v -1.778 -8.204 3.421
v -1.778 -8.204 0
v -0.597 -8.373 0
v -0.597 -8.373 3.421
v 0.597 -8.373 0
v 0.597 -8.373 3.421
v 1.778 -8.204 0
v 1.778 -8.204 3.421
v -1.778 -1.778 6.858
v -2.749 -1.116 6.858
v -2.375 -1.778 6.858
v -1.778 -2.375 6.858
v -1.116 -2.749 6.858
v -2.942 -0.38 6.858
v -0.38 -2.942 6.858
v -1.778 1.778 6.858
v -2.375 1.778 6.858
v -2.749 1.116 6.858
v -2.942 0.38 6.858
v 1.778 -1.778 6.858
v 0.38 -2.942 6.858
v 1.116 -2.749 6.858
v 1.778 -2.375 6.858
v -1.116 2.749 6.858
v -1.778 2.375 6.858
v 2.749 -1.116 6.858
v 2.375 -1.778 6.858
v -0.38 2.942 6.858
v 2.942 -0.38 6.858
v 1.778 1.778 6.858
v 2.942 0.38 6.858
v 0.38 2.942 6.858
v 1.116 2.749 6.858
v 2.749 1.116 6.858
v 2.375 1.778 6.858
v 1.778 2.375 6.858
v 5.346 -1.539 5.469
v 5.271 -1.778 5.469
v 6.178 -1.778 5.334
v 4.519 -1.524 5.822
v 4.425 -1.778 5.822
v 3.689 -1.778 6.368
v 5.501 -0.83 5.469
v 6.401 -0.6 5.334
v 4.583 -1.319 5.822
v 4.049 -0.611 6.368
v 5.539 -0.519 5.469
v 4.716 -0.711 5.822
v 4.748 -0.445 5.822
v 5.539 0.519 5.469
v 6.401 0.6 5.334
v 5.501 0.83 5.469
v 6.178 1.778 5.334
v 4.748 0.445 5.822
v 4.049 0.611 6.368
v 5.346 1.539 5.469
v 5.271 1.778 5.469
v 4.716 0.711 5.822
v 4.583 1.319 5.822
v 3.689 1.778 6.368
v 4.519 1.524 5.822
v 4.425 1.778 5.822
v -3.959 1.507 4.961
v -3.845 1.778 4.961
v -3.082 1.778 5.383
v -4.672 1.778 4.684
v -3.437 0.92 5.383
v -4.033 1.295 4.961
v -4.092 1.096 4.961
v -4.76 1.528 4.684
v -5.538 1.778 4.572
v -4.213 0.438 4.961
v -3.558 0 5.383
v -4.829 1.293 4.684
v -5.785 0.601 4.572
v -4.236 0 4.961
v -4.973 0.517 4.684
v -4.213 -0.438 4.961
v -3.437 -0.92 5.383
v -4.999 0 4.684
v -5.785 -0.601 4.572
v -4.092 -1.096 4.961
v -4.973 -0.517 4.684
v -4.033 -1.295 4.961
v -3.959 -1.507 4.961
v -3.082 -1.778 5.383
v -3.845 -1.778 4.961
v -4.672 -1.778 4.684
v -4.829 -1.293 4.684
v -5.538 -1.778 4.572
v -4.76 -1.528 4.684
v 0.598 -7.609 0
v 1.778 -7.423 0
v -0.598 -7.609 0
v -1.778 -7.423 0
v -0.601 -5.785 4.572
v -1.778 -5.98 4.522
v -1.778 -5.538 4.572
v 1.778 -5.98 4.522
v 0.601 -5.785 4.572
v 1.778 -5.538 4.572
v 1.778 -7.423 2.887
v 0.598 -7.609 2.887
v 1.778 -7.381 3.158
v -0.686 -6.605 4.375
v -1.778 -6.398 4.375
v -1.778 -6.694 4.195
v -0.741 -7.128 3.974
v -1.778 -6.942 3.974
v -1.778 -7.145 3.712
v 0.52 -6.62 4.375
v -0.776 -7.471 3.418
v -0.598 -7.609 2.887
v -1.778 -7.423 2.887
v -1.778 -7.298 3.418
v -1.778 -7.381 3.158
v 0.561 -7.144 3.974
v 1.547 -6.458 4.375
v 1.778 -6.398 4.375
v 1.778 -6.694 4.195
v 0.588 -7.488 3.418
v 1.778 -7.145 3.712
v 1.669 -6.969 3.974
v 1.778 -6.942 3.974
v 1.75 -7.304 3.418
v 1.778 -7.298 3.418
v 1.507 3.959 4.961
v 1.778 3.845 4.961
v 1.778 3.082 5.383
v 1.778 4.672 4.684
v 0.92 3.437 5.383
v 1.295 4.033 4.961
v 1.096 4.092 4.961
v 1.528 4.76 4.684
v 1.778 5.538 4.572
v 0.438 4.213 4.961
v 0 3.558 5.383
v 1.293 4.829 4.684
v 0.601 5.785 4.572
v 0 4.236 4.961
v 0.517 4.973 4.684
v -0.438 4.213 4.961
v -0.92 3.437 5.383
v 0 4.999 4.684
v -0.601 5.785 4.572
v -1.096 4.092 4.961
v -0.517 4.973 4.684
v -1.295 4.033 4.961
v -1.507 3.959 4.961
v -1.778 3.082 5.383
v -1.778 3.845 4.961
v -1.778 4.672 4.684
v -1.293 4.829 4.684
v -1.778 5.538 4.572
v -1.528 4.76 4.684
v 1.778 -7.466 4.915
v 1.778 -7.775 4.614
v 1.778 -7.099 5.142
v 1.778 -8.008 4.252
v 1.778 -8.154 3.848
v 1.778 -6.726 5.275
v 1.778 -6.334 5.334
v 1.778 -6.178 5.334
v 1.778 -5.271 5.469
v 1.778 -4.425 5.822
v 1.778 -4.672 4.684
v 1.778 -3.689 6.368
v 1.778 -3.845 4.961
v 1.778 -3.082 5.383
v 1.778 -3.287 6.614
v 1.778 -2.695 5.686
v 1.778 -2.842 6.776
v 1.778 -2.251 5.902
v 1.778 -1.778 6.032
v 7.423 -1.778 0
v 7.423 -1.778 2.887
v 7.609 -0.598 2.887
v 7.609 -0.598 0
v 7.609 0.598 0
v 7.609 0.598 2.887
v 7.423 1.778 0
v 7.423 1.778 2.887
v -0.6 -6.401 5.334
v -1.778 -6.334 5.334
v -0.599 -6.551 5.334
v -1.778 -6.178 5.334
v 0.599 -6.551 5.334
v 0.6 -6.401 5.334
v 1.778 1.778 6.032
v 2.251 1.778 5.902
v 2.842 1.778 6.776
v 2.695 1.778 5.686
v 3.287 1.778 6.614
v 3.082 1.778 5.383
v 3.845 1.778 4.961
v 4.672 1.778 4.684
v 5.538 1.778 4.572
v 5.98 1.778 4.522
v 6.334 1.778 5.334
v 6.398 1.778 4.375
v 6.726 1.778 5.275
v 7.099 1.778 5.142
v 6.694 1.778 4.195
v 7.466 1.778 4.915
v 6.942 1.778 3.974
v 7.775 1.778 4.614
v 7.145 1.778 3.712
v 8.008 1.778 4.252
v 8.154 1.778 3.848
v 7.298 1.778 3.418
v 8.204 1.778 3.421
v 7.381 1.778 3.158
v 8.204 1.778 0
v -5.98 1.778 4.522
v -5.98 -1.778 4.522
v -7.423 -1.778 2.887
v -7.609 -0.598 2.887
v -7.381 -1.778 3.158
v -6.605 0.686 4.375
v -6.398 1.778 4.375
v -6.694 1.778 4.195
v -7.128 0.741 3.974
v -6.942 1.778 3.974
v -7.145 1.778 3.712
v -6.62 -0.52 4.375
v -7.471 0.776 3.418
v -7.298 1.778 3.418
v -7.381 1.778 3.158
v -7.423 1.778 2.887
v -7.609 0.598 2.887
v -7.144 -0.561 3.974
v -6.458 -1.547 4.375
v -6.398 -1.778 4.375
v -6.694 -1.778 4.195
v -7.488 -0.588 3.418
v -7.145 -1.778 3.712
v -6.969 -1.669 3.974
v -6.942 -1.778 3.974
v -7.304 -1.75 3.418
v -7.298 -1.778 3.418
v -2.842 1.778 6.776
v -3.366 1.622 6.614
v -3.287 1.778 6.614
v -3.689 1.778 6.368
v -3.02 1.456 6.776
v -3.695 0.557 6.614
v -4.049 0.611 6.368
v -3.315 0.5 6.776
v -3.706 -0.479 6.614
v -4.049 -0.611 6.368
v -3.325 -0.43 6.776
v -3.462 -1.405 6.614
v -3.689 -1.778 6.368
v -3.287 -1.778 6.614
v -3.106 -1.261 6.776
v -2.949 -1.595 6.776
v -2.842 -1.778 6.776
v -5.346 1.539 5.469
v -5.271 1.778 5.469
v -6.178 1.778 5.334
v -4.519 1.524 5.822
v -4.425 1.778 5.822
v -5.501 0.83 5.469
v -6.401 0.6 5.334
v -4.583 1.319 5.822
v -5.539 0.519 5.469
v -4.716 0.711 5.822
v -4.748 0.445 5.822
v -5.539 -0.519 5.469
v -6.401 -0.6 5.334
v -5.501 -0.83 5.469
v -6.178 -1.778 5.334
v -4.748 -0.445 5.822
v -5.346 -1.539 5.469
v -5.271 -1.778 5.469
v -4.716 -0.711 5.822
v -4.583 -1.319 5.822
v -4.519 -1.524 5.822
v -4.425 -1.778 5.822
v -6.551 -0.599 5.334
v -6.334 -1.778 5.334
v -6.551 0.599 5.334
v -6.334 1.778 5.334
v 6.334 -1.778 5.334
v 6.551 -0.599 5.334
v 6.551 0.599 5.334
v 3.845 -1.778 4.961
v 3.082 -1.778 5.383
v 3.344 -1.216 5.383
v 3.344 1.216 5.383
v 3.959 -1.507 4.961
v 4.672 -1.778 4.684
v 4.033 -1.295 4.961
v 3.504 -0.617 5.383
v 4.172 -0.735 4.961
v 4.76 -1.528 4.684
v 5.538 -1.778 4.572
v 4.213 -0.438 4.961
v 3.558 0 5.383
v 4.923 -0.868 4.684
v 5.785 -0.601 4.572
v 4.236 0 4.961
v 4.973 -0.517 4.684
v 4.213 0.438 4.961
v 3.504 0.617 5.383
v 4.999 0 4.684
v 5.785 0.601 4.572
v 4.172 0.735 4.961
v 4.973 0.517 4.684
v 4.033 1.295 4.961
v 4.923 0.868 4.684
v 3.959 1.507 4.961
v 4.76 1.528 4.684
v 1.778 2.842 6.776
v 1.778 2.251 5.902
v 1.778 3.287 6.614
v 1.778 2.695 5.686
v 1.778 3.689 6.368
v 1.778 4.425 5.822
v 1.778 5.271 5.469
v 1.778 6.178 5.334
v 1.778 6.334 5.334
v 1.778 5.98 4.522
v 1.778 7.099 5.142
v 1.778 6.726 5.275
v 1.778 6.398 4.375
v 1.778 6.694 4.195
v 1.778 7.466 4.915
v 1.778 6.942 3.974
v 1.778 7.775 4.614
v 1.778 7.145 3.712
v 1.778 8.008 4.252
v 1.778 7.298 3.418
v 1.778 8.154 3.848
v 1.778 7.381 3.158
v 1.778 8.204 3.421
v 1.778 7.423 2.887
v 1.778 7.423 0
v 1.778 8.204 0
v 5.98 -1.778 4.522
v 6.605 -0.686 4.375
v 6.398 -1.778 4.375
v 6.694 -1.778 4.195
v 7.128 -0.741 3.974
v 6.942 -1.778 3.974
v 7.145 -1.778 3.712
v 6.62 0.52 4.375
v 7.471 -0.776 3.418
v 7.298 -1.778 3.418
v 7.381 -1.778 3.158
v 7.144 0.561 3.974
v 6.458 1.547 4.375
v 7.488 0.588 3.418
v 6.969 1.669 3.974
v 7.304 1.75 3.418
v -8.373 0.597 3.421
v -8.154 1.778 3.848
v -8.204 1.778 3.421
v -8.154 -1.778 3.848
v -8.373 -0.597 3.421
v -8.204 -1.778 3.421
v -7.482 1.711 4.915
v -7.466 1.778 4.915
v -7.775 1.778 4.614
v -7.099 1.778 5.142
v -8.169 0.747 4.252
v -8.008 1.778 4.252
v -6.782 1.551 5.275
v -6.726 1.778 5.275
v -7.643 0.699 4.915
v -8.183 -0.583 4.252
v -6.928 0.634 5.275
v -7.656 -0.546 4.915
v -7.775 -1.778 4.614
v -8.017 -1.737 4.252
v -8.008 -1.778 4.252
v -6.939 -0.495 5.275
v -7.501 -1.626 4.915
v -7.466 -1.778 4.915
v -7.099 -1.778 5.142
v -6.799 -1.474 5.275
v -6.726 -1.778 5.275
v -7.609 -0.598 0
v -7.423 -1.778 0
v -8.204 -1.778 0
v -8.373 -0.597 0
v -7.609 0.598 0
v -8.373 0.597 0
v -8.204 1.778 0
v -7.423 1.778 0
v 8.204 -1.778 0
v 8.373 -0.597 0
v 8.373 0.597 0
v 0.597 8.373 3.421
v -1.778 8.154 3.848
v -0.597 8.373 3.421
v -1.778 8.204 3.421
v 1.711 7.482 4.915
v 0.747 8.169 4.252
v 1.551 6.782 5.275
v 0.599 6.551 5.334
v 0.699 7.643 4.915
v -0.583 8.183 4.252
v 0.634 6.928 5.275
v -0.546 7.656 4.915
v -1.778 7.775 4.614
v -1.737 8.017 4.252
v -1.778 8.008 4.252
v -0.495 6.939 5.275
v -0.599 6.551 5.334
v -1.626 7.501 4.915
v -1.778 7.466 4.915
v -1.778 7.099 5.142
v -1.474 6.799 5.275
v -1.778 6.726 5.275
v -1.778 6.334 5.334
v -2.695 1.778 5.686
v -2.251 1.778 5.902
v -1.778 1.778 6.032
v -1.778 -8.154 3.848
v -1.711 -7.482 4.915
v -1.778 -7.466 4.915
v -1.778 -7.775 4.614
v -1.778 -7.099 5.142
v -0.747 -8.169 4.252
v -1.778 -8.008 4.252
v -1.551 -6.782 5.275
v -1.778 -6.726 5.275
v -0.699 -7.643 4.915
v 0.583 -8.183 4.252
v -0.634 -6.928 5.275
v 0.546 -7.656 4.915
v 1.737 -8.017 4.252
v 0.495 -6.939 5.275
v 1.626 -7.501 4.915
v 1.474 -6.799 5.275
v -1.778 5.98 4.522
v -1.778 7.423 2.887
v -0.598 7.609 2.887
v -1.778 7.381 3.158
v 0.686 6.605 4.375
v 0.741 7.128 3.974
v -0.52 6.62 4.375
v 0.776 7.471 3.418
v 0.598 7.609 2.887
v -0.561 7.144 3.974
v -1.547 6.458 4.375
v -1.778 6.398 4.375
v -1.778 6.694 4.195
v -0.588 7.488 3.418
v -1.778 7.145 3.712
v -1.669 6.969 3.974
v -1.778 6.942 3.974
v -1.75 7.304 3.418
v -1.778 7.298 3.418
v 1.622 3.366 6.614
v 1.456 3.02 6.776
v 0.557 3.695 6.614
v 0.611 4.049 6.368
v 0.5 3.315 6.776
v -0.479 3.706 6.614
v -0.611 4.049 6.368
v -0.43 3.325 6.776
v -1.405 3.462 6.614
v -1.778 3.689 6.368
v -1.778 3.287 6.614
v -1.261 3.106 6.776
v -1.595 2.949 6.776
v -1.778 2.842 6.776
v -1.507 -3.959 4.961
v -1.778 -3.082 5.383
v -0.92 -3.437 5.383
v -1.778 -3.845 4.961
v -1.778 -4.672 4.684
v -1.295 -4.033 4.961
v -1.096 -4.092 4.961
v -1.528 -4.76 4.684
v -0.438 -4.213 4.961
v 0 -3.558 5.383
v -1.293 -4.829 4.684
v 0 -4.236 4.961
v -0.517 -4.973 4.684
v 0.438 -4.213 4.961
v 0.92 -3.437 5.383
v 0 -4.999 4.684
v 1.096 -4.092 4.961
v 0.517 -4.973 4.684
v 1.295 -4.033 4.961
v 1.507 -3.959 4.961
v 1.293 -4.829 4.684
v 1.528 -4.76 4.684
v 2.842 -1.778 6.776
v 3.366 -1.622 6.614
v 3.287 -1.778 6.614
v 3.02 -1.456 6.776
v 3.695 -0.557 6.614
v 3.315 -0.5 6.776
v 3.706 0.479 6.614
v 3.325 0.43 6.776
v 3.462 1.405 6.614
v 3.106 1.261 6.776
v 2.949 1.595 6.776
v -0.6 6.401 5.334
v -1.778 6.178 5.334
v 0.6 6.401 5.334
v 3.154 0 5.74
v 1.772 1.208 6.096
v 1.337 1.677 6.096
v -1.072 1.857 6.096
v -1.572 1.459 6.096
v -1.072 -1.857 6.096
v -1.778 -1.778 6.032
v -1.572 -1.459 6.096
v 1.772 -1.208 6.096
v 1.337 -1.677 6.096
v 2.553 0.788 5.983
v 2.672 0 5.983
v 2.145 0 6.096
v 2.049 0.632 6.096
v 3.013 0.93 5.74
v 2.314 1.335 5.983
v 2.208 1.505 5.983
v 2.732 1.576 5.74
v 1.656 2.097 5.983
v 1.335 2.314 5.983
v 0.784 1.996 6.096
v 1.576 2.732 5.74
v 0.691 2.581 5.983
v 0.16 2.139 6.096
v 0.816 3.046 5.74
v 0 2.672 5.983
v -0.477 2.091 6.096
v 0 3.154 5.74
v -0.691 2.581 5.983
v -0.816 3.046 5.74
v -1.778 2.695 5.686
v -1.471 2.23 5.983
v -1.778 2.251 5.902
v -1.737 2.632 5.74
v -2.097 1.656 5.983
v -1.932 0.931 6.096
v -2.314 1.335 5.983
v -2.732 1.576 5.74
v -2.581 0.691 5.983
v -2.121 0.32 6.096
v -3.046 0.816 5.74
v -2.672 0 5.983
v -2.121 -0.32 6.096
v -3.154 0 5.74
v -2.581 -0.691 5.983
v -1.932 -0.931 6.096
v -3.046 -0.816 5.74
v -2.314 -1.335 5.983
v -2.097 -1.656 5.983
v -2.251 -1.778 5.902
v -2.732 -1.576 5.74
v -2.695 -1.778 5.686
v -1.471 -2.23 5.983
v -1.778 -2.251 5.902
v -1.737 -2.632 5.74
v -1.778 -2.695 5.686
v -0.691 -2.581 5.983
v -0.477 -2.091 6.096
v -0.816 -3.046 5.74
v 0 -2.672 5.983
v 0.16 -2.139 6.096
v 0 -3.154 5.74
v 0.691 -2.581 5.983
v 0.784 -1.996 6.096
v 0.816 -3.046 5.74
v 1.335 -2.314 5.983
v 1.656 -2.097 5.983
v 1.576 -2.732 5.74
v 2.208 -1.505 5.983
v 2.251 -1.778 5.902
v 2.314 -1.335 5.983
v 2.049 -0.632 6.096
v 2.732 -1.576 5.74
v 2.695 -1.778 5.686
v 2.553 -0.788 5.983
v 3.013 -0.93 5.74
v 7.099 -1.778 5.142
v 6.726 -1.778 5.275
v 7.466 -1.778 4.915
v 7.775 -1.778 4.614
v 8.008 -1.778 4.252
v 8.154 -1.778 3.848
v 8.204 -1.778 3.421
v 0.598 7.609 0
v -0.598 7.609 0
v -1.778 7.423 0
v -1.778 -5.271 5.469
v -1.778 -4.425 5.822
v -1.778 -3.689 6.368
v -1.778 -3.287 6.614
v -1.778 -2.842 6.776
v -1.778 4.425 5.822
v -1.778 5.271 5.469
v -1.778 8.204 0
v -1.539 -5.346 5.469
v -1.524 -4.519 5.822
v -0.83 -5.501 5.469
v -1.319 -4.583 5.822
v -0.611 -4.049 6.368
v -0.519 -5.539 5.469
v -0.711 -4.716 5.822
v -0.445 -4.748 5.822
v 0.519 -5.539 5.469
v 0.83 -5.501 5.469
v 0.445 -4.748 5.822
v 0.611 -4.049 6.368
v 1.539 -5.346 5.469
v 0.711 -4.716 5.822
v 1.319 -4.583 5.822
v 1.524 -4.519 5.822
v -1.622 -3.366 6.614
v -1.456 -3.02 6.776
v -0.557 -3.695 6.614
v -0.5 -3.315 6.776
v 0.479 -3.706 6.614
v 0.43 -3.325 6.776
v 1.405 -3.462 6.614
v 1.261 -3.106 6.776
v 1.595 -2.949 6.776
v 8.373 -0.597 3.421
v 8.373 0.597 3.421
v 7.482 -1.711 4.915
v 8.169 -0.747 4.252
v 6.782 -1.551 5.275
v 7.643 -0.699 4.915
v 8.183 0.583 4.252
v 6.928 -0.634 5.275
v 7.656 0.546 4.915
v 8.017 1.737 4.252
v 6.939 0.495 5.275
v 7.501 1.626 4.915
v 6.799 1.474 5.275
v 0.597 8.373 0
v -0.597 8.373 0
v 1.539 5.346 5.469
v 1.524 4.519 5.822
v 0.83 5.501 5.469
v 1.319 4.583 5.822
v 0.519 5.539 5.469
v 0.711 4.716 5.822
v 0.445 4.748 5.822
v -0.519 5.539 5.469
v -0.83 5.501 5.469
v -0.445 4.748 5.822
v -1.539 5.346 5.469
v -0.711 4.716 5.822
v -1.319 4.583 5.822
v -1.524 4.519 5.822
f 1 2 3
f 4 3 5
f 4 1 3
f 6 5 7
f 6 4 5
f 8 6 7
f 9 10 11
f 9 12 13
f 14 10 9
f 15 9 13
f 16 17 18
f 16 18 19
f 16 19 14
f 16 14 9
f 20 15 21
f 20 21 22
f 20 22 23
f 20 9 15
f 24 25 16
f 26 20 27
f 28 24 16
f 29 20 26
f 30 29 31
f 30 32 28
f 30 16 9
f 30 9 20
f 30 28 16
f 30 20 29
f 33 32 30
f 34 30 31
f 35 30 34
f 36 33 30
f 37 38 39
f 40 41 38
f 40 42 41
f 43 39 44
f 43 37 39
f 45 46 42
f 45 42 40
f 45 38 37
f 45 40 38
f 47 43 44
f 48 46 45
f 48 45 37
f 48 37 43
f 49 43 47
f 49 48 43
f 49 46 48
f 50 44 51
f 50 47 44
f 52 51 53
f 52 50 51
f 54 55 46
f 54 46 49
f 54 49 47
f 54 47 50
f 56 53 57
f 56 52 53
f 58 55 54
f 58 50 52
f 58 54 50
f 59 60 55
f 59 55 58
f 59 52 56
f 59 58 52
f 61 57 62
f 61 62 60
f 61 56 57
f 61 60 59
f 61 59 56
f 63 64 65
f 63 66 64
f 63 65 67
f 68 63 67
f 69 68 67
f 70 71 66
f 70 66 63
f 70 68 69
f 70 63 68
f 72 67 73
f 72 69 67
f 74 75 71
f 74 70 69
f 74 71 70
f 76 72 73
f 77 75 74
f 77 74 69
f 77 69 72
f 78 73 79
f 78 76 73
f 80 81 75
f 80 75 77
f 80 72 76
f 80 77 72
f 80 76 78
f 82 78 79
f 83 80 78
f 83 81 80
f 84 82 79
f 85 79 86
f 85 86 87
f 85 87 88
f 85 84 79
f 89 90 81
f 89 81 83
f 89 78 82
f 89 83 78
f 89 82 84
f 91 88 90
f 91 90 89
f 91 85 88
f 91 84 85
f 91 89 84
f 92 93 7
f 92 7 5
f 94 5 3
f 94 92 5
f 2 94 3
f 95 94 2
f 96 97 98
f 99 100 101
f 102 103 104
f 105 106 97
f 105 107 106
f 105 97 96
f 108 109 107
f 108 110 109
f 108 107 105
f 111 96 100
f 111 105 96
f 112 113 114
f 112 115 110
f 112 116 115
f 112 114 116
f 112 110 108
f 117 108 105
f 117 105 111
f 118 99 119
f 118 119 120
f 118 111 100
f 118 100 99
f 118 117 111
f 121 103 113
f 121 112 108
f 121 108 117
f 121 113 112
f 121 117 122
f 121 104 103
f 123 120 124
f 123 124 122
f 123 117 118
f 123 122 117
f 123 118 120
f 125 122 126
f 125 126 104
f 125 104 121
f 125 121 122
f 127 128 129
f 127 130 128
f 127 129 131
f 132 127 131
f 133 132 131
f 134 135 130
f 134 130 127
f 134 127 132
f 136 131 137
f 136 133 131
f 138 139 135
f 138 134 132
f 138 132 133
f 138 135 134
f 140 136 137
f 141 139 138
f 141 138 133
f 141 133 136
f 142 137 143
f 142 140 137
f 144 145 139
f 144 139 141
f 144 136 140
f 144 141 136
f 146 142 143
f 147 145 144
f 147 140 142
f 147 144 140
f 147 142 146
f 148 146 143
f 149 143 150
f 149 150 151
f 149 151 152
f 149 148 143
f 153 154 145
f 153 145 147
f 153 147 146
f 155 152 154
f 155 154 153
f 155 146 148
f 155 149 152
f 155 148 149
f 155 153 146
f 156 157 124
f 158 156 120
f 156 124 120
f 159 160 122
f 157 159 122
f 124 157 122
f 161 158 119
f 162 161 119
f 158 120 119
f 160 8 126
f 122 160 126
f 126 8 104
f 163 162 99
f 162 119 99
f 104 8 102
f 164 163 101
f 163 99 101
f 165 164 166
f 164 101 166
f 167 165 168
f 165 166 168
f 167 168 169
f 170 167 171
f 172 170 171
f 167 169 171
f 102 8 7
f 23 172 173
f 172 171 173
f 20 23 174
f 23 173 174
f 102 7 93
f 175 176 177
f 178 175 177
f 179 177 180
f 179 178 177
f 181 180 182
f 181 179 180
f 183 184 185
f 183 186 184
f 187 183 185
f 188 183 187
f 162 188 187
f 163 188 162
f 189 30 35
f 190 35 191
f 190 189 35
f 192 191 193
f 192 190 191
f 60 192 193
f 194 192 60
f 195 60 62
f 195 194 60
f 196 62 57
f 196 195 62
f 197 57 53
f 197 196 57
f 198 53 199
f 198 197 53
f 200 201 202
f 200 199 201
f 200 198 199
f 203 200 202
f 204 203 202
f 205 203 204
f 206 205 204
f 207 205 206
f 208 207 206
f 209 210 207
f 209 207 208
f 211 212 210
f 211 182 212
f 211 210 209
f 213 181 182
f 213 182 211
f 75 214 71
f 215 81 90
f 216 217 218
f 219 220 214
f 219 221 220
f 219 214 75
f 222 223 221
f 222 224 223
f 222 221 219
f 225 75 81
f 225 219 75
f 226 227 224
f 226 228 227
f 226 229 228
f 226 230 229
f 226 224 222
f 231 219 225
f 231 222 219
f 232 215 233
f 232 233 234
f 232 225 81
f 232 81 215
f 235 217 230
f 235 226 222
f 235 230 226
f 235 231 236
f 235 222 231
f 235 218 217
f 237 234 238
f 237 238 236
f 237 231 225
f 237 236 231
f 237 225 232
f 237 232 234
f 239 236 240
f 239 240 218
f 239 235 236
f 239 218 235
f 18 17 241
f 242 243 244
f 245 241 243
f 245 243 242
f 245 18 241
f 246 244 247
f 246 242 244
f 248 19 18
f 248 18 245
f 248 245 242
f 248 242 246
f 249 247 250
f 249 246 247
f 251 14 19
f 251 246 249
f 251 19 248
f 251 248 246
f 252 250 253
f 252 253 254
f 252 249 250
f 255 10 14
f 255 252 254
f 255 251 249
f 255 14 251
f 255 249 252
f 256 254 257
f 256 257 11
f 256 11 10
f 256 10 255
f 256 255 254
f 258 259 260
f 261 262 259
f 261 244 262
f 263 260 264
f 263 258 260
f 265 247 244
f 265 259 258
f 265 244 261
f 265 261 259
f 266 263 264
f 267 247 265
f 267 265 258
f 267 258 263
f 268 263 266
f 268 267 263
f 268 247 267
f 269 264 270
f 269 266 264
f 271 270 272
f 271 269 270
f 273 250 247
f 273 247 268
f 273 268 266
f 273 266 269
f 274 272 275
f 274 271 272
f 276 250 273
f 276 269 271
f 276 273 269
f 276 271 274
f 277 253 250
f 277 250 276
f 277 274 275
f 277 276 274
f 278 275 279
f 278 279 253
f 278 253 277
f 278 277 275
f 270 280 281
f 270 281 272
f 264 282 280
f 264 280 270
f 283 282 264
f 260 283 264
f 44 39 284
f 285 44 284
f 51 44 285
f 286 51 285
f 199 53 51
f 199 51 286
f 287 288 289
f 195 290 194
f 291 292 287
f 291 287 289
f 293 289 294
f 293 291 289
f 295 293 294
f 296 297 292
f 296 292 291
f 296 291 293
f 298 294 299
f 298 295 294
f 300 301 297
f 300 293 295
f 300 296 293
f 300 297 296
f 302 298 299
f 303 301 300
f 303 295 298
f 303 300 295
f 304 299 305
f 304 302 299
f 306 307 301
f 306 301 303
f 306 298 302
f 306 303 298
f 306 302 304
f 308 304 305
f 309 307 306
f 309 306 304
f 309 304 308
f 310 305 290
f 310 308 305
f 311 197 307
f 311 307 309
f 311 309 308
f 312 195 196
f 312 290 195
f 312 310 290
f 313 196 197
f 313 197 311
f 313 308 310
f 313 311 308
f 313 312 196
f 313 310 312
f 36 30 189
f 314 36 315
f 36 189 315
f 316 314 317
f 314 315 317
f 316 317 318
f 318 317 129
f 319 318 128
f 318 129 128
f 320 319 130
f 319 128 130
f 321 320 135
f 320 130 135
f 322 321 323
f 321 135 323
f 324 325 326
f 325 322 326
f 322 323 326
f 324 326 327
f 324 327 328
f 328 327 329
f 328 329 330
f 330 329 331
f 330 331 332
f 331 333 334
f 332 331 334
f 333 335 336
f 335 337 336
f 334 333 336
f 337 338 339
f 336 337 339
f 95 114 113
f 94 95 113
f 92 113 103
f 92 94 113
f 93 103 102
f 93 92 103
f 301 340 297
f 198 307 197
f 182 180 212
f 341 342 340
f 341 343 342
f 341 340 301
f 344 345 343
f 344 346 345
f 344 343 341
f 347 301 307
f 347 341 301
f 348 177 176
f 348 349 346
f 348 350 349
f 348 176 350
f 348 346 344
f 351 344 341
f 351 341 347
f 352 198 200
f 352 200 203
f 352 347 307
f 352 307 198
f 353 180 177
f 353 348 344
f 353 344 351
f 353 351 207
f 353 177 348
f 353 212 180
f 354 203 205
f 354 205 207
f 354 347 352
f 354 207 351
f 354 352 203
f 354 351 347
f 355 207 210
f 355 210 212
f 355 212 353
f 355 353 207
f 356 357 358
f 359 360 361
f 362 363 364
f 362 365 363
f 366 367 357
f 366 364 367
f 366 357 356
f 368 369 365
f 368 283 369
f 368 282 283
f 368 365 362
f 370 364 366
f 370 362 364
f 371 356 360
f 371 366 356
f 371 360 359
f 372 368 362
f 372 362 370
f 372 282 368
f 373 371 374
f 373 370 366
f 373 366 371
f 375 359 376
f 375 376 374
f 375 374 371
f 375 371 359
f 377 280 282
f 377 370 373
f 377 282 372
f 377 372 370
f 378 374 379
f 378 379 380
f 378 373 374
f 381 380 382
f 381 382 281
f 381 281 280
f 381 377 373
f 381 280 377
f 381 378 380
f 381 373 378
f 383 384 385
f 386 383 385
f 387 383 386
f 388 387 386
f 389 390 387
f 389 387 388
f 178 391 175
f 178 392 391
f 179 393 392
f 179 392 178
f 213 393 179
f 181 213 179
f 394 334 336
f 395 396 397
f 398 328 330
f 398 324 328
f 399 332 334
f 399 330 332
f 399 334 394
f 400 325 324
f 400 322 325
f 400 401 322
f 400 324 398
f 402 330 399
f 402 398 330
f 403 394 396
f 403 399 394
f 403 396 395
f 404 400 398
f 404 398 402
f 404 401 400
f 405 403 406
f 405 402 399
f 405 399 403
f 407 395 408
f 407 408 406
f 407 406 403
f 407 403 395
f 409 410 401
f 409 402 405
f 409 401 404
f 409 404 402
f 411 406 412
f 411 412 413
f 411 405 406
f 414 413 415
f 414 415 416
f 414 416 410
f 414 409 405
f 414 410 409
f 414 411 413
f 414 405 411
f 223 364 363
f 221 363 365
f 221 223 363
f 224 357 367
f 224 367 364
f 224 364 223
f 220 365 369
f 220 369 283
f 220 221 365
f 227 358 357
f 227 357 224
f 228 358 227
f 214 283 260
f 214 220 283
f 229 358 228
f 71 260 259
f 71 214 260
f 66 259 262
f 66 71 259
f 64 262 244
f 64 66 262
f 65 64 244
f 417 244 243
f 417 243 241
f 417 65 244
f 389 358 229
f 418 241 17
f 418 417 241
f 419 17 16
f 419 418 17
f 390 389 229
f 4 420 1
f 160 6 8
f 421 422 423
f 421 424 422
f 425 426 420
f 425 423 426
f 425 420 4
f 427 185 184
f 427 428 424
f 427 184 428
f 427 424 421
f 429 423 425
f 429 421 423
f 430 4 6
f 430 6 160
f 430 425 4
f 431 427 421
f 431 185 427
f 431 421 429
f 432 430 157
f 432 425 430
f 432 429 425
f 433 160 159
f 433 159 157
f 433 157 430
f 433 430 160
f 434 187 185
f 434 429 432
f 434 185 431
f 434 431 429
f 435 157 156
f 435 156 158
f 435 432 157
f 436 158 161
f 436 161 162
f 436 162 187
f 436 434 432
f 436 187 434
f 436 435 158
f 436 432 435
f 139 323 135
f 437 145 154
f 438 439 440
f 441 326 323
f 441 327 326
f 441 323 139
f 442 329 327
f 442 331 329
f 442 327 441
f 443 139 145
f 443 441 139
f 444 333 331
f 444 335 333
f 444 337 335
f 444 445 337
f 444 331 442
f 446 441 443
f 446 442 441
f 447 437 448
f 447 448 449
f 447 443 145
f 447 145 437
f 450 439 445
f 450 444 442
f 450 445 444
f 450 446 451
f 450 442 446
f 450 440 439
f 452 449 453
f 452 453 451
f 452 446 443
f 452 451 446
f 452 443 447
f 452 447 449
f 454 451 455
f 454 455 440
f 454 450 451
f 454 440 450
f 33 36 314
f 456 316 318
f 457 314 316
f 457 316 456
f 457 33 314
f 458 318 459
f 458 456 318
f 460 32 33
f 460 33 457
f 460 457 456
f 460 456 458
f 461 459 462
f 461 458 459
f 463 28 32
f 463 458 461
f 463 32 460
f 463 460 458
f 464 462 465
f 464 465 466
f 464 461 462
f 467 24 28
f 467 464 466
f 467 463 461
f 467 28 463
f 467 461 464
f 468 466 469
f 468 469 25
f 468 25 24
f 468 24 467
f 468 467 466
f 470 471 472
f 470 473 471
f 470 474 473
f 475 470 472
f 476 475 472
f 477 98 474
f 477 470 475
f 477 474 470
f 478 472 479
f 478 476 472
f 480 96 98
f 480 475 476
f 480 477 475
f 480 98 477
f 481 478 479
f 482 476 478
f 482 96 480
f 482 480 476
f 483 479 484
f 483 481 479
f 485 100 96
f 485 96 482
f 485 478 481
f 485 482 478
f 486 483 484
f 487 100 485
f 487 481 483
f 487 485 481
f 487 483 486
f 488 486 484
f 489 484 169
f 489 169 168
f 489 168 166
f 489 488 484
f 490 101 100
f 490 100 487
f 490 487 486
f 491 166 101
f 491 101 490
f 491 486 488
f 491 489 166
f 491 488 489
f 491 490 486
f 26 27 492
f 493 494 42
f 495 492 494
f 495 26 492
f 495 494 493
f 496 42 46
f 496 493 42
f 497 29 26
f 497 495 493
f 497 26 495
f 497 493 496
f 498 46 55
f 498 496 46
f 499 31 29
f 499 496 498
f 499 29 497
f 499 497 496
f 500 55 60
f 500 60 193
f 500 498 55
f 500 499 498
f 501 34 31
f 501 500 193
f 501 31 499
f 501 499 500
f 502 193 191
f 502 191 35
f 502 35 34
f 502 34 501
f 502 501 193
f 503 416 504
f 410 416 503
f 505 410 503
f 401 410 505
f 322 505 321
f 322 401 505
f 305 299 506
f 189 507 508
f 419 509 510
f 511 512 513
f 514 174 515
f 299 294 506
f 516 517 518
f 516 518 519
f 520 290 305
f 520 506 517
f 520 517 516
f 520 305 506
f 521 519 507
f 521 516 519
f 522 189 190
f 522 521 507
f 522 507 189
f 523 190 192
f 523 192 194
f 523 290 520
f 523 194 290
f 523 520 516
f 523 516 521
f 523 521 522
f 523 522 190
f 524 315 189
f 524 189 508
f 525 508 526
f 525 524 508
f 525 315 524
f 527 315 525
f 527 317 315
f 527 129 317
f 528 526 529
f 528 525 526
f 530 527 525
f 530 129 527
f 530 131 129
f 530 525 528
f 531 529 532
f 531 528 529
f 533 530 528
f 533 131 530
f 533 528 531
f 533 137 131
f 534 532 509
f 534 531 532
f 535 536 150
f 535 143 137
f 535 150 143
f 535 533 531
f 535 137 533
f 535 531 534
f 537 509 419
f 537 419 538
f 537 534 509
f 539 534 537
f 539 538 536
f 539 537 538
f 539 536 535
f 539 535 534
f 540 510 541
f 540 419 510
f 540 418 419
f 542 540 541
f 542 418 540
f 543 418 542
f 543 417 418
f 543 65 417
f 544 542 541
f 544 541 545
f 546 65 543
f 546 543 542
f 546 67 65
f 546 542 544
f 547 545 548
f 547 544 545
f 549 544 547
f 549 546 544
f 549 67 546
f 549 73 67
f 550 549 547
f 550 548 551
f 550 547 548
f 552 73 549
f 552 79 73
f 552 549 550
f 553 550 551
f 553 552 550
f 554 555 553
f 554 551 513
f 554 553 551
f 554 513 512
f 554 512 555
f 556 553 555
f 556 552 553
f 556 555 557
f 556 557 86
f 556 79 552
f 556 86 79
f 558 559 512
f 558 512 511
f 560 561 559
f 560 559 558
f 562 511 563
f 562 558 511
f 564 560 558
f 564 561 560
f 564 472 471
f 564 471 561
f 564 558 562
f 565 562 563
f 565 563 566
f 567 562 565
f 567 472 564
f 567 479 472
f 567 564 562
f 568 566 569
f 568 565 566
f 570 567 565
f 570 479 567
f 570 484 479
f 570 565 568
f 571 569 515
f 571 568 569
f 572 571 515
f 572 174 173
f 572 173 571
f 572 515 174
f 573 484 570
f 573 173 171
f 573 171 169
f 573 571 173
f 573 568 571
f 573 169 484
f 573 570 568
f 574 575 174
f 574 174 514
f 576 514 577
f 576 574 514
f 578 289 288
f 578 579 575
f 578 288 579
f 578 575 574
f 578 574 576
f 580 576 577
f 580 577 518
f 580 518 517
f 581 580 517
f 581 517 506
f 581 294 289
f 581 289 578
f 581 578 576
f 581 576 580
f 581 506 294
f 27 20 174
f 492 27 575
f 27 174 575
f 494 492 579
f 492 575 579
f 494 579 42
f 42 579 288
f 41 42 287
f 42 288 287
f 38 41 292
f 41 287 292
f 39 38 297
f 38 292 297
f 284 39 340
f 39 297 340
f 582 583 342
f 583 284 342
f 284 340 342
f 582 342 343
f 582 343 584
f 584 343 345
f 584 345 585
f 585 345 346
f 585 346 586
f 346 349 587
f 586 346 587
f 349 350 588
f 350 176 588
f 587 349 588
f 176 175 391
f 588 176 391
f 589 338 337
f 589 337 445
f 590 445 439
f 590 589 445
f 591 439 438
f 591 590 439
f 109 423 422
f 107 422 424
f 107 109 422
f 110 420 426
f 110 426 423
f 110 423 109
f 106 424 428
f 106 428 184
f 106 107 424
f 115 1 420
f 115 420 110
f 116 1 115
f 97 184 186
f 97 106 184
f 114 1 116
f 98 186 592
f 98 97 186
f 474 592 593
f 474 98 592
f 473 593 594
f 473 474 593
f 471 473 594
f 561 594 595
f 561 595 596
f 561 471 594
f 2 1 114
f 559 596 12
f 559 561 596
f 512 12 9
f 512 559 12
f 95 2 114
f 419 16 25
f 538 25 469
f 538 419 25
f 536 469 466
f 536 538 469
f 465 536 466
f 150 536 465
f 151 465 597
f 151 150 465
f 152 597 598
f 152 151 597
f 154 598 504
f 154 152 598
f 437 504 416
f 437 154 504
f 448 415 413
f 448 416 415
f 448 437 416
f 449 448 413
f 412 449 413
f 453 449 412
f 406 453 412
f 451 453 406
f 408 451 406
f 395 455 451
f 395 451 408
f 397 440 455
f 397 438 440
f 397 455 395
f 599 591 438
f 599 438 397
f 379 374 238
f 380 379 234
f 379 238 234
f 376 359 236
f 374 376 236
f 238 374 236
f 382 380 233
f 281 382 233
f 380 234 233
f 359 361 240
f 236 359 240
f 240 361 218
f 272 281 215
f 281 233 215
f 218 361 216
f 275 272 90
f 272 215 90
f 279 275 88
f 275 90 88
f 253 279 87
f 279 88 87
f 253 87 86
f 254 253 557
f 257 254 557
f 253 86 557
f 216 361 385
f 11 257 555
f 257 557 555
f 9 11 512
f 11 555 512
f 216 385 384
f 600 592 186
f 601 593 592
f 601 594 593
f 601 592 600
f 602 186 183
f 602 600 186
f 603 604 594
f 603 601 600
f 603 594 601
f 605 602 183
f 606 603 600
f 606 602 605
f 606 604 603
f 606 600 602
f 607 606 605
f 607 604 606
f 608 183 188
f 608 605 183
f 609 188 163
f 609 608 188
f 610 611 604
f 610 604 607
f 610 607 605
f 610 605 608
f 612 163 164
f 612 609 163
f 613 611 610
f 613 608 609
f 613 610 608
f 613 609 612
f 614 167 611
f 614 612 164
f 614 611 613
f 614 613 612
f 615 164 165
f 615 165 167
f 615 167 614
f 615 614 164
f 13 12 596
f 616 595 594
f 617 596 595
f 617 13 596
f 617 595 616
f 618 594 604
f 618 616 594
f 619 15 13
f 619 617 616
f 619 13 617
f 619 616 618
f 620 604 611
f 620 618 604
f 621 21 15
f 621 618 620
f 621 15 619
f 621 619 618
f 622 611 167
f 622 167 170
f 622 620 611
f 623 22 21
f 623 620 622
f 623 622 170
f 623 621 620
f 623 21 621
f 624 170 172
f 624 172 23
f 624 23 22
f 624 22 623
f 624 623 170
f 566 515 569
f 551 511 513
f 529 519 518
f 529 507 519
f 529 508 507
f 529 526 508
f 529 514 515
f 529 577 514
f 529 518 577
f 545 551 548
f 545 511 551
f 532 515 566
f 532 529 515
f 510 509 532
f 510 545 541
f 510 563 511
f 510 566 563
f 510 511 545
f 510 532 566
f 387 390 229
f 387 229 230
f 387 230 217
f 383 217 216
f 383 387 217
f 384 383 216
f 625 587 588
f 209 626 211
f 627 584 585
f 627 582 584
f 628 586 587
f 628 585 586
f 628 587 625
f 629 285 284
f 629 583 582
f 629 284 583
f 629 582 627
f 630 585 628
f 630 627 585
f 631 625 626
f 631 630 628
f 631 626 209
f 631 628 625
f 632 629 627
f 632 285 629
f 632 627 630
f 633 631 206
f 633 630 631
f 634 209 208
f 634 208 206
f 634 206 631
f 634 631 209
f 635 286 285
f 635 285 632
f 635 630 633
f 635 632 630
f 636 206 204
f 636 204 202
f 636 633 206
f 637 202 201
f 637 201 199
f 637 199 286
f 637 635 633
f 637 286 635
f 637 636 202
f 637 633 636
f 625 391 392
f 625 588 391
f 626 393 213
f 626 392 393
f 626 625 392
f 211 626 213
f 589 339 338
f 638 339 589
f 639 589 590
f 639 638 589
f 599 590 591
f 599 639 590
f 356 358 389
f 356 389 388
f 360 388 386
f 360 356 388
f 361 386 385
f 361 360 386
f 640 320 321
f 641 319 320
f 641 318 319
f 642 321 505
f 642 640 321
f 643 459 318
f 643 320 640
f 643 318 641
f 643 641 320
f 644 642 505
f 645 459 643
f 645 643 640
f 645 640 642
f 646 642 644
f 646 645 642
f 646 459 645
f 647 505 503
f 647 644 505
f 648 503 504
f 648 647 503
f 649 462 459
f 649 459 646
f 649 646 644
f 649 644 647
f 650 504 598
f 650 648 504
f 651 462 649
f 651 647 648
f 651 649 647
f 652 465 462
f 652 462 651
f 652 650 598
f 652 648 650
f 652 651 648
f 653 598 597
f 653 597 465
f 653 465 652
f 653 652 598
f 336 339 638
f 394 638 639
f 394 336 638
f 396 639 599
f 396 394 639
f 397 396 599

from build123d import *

# Parameters (mm, degrees)
F2_W     = 7.197865
F2_H     = 7.241845
F2_W_2   = 7.277308
F2_H_2   = 7.777737
F2_W_3   = 7.559205
F2_H_3   = 7.282023
F2_W_4   = 6.779674
F2_H_4   = 6.794866
F3_DEPTH = 25.4


with BuildPart() as f1:
    # F0 (on Front) → F1 (revolve)
    with BuildSketch(Plane.XZ):
        with BuildLine():
            Line((2.966464, 6.858), (0, 6.858))
            Line((0, 6.858), (0, 6.096))
            Line((0, 6.096), (2.144658, 6.096))
            ThreePointArc((2.144658, 6.096), (2.920532, 5.876714), (3.557912, 5.382938))
            ThreePointArc((3.557912, 5.382938), (4.622787, 4.797905), (5.8166, 4.572))
            ThreePointArc((5.8166, 4.572), (7.055252, 4.085911), (7.6327, 2.887122))
            Line((7.6327, 2.887122), (7.6327, 0))
            Line((7.6327, 0), (8.3947, 0))
            Line((8.3947, 0), (8.3947, 3.42098))
            ThreePointArc((8.3947, 3.42098), (7.867128, 4.738692), (6.5786, 5.334))
            Line((6.5786, 5.334), (6.428647, 5.334))
            ThreePointArc((6.428647, 5.334), (5.158581, 5.617736), (4.09507, 6.367748))
            ThreePointArc((4.09507, 6.367748), (3.567043, 6.696386), (2.966464, 6.858))
        make_face()
    revolve(axis=Axis((0, 0, 5.133816), (0, 0, 1)))

    # F2 (on Top) → F3 (cut)
    with BuildSketch(Plane.XY):
        with Locations((-5.376932, -5.398923)):
            Rectangle(F2_W, F2_H)
        with Locations((5.416654, -5.666868)):
            Rectangle(F2_W_2, F2_H_2)
        with Locations((5.557602, 5.419011)):
            Rectangle(F2_W_3, F2_H_3)
        with Locations((-5.167837, 5.175433)):
            Rectangle(F2_W_4, F2_H_4)
    extrude(amount=F3_DEPTH, mode=Mode.SUBTRACT)


solid = f1.part
